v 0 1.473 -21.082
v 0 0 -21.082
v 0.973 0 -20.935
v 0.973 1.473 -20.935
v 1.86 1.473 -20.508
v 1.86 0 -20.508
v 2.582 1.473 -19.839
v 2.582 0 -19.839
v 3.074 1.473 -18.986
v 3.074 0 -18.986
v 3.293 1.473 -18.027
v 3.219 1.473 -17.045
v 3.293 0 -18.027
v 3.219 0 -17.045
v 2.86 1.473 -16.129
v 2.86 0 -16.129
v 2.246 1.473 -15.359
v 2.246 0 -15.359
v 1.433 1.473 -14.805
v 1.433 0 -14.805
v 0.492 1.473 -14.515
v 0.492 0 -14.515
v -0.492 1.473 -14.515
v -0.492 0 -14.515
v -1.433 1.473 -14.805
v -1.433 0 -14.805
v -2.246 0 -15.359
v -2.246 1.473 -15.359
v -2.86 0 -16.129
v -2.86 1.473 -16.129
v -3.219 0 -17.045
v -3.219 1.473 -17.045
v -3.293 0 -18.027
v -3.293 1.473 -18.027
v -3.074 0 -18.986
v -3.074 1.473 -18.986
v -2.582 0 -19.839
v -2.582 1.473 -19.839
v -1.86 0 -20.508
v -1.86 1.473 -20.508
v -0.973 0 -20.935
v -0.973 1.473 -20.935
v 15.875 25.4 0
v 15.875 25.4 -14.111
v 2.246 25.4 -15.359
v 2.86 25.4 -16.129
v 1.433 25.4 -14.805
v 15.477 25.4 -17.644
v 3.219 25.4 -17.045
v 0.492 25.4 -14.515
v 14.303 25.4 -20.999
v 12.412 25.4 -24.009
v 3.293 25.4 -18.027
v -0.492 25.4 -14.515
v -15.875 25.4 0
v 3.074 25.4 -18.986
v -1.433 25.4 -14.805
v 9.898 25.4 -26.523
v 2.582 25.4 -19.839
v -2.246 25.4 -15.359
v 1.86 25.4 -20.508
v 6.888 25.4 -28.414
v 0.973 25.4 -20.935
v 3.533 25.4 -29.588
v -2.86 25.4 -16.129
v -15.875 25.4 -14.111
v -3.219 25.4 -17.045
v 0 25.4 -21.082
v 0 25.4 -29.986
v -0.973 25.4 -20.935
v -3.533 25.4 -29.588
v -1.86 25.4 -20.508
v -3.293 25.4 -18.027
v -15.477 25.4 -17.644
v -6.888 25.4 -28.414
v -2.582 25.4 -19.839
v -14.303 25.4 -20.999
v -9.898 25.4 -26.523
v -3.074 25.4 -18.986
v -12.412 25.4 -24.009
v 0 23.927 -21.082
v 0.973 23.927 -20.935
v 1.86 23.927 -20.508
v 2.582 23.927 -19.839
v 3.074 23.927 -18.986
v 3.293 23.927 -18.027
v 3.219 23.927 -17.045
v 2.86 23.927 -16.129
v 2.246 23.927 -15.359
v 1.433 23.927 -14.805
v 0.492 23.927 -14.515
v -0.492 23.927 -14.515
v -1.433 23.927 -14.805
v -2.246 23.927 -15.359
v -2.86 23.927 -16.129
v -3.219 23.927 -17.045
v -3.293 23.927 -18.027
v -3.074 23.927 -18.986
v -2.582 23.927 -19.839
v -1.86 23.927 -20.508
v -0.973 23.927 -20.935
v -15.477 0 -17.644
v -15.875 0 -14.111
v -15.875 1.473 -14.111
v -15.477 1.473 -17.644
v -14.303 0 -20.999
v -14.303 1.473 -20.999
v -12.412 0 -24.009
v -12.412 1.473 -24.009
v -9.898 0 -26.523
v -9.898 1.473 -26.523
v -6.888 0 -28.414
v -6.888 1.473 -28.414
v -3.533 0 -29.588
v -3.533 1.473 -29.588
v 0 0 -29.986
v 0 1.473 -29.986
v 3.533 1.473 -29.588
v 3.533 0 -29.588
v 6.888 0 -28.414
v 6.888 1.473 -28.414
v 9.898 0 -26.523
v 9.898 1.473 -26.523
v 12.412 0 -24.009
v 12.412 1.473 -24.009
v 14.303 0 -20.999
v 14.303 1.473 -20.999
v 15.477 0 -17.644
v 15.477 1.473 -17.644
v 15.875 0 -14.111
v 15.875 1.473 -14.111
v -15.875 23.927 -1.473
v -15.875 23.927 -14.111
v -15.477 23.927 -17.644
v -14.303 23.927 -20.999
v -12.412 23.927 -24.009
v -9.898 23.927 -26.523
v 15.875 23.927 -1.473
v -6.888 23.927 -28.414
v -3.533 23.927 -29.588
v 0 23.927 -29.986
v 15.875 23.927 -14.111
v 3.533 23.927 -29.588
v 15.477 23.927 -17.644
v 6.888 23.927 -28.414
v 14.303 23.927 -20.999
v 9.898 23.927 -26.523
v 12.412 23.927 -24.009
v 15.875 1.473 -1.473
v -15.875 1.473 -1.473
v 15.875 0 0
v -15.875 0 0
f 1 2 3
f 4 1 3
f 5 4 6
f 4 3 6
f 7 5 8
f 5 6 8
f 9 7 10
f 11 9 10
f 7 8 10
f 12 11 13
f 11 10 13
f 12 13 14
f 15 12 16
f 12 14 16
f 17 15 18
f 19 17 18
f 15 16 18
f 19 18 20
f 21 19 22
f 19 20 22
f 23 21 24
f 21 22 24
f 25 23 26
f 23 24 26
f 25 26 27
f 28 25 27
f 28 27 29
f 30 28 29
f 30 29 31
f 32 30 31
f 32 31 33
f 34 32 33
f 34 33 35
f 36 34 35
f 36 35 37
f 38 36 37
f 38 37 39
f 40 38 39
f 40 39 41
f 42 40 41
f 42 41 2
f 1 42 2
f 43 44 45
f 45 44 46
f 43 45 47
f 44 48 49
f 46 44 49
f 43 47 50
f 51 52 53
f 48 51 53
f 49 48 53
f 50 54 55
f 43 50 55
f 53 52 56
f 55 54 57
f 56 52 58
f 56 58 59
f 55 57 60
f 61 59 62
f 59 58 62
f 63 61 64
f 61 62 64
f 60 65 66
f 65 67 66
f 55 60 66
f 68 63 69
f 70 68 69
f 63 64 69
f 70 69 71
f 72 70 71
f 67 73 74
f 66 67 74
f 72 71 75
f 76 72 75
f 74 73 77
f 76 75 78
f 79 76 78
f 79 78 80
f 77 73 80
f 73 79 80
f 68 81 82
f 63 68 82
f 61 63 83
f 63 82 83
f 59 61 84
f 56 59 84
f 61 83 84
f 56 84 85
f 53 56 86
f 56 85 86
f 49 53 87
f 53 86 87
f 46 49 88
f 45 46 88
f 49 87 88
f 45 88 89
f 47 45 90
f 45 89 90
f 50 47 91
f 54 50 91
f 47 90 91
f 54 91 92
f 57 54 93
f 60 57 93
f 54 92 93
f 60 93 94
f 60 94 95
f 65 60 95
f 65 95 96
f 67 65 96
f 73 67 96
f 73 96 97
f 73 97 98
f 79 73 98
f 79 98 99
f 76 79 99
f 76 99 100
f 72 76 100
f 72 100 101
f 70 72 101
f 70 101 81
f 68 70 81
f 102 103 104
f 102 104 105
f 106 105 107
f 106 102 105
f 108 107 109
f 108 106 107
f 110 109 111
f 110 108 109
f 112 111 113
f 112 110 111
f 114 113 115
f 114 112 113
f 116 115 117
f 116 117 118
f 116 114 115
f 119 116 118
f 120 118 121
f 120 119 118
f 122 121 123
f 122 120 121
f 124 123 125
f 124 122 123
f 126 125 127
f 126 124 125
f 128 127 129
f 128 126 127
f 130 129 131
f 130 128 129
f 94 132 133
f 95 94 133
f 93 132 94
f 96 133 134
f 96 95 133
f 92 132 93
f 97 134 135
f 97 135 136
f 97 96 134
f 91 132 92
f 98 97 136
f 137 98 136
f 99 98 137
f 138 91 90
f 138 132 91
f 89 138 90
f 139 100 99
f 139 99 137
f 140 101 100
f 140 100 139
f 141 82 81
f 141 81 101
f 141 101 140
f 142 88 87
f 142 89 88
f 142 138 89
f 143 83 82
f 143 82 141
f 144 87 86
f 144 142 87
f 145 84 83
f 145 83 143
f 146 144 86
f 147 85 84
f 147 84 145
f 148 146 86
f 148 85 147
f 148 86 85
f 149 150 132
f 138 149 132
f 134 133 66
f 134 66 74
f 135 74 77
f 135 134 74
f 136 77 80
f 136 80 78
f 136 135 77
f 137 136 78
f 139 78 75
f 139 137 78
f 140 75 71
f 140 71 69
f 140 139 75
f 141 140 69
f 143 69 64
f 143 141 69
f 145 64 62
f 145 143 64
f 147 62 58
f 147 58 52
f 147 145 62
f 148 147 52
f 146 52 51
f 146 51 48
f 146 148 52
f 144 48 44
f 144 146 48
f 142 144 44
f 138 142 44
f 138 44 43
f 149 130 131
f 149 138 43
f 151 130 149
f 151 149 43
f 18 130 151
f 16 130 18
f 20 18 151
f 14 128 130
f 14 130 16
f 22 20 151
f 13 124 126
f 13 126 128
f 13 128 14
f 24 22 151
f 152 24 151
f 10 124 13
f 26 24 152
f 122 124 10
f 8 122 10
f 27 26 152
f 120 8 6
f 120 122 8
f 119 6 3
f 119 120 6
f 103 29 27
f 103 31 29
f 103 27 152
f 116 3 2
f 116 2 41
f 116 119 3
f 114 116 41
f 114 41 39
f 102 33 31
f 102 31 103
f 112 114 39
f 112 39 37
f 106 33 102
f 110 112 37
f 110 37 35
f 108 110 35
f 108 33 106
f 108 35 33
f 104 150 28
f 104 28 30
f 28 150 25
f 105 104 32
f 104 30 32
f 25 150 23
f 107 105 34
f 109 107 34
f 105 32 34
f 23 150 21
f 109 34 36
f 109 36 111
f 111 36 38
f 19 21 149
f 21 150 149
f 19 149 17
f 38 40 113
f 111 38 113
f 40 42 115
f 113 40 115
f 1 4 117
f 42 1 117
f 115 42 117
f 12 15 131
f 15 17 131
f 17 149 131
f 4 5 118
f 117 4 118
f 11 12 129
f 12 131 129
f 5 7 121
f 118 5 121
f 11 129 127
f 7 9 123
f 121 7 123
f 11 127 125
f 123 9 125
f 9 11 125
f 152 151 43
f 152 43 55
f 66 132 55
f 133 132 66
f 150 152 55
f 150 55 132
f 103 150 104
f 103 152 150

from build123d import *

# Parameters (mm, degrees)
BOSS_EXTRUDE2_DEPTH = 25.4
SKETCH2_W           = 64.689945596
SKETCH2_H           = 22.4536
CUT_EXTRUDE1_DEPTH  = 51.521177338
SKETCH5_R           = 3.302
CUT_EXTRUDE2_DEPTH  = 43.38328072


with BuildPart() as part:
    # Sketch1 → Boss-Extrude2 (new body)
    with BuildSketch(Plane(origin=(0, 0, 0), x_dir=(1, 0, 0), z_dir=(0, 1, 0))):
        with BuildLine():
            Line((15.875, 14.111111111), (15.875, 0))
            Line((15.875, 0), (0, 0))
            Line((0, 0), (-15.875, 0))
            Line((-15.875, 0), (-15.875, 14.111111111))
            ThreePointArc((-15.875, 14.111111111), (0, 29.986111111), (15.875, 14.111111111))
        make_face()
    extrude(amount=BOSS_EXTRUDE2_DEPTH)

    # Sketch2 → Cut-Extrude1 (cut, through all)
    with BuildSketch(Plane(origin=(15.875, 0, 0), x_dir=(0, 0, -1), z_dir=(1, 0, 0))):
        with Locations((33.818172798, 12.7)):
            Rectangle(SKETCH2_W, SKETCH2_H)
    extrude(amount=-CUT_EXTRUDE1_DEPTH, mode=Mode.SUBTRACT)

    # Sketch5 → Cut-Extrude2 (cut, through all)
    with BuildSketch(Plane.XZ):
        with Locations(Location((0, -17.78, 0), (0, 0, 270))):
            Circle(SKETCH5_R)
    extrude(amount=-CUT_EXTRUDE2_DEPTH, mode=Mode.SUBTRACT)


solid = part.part
